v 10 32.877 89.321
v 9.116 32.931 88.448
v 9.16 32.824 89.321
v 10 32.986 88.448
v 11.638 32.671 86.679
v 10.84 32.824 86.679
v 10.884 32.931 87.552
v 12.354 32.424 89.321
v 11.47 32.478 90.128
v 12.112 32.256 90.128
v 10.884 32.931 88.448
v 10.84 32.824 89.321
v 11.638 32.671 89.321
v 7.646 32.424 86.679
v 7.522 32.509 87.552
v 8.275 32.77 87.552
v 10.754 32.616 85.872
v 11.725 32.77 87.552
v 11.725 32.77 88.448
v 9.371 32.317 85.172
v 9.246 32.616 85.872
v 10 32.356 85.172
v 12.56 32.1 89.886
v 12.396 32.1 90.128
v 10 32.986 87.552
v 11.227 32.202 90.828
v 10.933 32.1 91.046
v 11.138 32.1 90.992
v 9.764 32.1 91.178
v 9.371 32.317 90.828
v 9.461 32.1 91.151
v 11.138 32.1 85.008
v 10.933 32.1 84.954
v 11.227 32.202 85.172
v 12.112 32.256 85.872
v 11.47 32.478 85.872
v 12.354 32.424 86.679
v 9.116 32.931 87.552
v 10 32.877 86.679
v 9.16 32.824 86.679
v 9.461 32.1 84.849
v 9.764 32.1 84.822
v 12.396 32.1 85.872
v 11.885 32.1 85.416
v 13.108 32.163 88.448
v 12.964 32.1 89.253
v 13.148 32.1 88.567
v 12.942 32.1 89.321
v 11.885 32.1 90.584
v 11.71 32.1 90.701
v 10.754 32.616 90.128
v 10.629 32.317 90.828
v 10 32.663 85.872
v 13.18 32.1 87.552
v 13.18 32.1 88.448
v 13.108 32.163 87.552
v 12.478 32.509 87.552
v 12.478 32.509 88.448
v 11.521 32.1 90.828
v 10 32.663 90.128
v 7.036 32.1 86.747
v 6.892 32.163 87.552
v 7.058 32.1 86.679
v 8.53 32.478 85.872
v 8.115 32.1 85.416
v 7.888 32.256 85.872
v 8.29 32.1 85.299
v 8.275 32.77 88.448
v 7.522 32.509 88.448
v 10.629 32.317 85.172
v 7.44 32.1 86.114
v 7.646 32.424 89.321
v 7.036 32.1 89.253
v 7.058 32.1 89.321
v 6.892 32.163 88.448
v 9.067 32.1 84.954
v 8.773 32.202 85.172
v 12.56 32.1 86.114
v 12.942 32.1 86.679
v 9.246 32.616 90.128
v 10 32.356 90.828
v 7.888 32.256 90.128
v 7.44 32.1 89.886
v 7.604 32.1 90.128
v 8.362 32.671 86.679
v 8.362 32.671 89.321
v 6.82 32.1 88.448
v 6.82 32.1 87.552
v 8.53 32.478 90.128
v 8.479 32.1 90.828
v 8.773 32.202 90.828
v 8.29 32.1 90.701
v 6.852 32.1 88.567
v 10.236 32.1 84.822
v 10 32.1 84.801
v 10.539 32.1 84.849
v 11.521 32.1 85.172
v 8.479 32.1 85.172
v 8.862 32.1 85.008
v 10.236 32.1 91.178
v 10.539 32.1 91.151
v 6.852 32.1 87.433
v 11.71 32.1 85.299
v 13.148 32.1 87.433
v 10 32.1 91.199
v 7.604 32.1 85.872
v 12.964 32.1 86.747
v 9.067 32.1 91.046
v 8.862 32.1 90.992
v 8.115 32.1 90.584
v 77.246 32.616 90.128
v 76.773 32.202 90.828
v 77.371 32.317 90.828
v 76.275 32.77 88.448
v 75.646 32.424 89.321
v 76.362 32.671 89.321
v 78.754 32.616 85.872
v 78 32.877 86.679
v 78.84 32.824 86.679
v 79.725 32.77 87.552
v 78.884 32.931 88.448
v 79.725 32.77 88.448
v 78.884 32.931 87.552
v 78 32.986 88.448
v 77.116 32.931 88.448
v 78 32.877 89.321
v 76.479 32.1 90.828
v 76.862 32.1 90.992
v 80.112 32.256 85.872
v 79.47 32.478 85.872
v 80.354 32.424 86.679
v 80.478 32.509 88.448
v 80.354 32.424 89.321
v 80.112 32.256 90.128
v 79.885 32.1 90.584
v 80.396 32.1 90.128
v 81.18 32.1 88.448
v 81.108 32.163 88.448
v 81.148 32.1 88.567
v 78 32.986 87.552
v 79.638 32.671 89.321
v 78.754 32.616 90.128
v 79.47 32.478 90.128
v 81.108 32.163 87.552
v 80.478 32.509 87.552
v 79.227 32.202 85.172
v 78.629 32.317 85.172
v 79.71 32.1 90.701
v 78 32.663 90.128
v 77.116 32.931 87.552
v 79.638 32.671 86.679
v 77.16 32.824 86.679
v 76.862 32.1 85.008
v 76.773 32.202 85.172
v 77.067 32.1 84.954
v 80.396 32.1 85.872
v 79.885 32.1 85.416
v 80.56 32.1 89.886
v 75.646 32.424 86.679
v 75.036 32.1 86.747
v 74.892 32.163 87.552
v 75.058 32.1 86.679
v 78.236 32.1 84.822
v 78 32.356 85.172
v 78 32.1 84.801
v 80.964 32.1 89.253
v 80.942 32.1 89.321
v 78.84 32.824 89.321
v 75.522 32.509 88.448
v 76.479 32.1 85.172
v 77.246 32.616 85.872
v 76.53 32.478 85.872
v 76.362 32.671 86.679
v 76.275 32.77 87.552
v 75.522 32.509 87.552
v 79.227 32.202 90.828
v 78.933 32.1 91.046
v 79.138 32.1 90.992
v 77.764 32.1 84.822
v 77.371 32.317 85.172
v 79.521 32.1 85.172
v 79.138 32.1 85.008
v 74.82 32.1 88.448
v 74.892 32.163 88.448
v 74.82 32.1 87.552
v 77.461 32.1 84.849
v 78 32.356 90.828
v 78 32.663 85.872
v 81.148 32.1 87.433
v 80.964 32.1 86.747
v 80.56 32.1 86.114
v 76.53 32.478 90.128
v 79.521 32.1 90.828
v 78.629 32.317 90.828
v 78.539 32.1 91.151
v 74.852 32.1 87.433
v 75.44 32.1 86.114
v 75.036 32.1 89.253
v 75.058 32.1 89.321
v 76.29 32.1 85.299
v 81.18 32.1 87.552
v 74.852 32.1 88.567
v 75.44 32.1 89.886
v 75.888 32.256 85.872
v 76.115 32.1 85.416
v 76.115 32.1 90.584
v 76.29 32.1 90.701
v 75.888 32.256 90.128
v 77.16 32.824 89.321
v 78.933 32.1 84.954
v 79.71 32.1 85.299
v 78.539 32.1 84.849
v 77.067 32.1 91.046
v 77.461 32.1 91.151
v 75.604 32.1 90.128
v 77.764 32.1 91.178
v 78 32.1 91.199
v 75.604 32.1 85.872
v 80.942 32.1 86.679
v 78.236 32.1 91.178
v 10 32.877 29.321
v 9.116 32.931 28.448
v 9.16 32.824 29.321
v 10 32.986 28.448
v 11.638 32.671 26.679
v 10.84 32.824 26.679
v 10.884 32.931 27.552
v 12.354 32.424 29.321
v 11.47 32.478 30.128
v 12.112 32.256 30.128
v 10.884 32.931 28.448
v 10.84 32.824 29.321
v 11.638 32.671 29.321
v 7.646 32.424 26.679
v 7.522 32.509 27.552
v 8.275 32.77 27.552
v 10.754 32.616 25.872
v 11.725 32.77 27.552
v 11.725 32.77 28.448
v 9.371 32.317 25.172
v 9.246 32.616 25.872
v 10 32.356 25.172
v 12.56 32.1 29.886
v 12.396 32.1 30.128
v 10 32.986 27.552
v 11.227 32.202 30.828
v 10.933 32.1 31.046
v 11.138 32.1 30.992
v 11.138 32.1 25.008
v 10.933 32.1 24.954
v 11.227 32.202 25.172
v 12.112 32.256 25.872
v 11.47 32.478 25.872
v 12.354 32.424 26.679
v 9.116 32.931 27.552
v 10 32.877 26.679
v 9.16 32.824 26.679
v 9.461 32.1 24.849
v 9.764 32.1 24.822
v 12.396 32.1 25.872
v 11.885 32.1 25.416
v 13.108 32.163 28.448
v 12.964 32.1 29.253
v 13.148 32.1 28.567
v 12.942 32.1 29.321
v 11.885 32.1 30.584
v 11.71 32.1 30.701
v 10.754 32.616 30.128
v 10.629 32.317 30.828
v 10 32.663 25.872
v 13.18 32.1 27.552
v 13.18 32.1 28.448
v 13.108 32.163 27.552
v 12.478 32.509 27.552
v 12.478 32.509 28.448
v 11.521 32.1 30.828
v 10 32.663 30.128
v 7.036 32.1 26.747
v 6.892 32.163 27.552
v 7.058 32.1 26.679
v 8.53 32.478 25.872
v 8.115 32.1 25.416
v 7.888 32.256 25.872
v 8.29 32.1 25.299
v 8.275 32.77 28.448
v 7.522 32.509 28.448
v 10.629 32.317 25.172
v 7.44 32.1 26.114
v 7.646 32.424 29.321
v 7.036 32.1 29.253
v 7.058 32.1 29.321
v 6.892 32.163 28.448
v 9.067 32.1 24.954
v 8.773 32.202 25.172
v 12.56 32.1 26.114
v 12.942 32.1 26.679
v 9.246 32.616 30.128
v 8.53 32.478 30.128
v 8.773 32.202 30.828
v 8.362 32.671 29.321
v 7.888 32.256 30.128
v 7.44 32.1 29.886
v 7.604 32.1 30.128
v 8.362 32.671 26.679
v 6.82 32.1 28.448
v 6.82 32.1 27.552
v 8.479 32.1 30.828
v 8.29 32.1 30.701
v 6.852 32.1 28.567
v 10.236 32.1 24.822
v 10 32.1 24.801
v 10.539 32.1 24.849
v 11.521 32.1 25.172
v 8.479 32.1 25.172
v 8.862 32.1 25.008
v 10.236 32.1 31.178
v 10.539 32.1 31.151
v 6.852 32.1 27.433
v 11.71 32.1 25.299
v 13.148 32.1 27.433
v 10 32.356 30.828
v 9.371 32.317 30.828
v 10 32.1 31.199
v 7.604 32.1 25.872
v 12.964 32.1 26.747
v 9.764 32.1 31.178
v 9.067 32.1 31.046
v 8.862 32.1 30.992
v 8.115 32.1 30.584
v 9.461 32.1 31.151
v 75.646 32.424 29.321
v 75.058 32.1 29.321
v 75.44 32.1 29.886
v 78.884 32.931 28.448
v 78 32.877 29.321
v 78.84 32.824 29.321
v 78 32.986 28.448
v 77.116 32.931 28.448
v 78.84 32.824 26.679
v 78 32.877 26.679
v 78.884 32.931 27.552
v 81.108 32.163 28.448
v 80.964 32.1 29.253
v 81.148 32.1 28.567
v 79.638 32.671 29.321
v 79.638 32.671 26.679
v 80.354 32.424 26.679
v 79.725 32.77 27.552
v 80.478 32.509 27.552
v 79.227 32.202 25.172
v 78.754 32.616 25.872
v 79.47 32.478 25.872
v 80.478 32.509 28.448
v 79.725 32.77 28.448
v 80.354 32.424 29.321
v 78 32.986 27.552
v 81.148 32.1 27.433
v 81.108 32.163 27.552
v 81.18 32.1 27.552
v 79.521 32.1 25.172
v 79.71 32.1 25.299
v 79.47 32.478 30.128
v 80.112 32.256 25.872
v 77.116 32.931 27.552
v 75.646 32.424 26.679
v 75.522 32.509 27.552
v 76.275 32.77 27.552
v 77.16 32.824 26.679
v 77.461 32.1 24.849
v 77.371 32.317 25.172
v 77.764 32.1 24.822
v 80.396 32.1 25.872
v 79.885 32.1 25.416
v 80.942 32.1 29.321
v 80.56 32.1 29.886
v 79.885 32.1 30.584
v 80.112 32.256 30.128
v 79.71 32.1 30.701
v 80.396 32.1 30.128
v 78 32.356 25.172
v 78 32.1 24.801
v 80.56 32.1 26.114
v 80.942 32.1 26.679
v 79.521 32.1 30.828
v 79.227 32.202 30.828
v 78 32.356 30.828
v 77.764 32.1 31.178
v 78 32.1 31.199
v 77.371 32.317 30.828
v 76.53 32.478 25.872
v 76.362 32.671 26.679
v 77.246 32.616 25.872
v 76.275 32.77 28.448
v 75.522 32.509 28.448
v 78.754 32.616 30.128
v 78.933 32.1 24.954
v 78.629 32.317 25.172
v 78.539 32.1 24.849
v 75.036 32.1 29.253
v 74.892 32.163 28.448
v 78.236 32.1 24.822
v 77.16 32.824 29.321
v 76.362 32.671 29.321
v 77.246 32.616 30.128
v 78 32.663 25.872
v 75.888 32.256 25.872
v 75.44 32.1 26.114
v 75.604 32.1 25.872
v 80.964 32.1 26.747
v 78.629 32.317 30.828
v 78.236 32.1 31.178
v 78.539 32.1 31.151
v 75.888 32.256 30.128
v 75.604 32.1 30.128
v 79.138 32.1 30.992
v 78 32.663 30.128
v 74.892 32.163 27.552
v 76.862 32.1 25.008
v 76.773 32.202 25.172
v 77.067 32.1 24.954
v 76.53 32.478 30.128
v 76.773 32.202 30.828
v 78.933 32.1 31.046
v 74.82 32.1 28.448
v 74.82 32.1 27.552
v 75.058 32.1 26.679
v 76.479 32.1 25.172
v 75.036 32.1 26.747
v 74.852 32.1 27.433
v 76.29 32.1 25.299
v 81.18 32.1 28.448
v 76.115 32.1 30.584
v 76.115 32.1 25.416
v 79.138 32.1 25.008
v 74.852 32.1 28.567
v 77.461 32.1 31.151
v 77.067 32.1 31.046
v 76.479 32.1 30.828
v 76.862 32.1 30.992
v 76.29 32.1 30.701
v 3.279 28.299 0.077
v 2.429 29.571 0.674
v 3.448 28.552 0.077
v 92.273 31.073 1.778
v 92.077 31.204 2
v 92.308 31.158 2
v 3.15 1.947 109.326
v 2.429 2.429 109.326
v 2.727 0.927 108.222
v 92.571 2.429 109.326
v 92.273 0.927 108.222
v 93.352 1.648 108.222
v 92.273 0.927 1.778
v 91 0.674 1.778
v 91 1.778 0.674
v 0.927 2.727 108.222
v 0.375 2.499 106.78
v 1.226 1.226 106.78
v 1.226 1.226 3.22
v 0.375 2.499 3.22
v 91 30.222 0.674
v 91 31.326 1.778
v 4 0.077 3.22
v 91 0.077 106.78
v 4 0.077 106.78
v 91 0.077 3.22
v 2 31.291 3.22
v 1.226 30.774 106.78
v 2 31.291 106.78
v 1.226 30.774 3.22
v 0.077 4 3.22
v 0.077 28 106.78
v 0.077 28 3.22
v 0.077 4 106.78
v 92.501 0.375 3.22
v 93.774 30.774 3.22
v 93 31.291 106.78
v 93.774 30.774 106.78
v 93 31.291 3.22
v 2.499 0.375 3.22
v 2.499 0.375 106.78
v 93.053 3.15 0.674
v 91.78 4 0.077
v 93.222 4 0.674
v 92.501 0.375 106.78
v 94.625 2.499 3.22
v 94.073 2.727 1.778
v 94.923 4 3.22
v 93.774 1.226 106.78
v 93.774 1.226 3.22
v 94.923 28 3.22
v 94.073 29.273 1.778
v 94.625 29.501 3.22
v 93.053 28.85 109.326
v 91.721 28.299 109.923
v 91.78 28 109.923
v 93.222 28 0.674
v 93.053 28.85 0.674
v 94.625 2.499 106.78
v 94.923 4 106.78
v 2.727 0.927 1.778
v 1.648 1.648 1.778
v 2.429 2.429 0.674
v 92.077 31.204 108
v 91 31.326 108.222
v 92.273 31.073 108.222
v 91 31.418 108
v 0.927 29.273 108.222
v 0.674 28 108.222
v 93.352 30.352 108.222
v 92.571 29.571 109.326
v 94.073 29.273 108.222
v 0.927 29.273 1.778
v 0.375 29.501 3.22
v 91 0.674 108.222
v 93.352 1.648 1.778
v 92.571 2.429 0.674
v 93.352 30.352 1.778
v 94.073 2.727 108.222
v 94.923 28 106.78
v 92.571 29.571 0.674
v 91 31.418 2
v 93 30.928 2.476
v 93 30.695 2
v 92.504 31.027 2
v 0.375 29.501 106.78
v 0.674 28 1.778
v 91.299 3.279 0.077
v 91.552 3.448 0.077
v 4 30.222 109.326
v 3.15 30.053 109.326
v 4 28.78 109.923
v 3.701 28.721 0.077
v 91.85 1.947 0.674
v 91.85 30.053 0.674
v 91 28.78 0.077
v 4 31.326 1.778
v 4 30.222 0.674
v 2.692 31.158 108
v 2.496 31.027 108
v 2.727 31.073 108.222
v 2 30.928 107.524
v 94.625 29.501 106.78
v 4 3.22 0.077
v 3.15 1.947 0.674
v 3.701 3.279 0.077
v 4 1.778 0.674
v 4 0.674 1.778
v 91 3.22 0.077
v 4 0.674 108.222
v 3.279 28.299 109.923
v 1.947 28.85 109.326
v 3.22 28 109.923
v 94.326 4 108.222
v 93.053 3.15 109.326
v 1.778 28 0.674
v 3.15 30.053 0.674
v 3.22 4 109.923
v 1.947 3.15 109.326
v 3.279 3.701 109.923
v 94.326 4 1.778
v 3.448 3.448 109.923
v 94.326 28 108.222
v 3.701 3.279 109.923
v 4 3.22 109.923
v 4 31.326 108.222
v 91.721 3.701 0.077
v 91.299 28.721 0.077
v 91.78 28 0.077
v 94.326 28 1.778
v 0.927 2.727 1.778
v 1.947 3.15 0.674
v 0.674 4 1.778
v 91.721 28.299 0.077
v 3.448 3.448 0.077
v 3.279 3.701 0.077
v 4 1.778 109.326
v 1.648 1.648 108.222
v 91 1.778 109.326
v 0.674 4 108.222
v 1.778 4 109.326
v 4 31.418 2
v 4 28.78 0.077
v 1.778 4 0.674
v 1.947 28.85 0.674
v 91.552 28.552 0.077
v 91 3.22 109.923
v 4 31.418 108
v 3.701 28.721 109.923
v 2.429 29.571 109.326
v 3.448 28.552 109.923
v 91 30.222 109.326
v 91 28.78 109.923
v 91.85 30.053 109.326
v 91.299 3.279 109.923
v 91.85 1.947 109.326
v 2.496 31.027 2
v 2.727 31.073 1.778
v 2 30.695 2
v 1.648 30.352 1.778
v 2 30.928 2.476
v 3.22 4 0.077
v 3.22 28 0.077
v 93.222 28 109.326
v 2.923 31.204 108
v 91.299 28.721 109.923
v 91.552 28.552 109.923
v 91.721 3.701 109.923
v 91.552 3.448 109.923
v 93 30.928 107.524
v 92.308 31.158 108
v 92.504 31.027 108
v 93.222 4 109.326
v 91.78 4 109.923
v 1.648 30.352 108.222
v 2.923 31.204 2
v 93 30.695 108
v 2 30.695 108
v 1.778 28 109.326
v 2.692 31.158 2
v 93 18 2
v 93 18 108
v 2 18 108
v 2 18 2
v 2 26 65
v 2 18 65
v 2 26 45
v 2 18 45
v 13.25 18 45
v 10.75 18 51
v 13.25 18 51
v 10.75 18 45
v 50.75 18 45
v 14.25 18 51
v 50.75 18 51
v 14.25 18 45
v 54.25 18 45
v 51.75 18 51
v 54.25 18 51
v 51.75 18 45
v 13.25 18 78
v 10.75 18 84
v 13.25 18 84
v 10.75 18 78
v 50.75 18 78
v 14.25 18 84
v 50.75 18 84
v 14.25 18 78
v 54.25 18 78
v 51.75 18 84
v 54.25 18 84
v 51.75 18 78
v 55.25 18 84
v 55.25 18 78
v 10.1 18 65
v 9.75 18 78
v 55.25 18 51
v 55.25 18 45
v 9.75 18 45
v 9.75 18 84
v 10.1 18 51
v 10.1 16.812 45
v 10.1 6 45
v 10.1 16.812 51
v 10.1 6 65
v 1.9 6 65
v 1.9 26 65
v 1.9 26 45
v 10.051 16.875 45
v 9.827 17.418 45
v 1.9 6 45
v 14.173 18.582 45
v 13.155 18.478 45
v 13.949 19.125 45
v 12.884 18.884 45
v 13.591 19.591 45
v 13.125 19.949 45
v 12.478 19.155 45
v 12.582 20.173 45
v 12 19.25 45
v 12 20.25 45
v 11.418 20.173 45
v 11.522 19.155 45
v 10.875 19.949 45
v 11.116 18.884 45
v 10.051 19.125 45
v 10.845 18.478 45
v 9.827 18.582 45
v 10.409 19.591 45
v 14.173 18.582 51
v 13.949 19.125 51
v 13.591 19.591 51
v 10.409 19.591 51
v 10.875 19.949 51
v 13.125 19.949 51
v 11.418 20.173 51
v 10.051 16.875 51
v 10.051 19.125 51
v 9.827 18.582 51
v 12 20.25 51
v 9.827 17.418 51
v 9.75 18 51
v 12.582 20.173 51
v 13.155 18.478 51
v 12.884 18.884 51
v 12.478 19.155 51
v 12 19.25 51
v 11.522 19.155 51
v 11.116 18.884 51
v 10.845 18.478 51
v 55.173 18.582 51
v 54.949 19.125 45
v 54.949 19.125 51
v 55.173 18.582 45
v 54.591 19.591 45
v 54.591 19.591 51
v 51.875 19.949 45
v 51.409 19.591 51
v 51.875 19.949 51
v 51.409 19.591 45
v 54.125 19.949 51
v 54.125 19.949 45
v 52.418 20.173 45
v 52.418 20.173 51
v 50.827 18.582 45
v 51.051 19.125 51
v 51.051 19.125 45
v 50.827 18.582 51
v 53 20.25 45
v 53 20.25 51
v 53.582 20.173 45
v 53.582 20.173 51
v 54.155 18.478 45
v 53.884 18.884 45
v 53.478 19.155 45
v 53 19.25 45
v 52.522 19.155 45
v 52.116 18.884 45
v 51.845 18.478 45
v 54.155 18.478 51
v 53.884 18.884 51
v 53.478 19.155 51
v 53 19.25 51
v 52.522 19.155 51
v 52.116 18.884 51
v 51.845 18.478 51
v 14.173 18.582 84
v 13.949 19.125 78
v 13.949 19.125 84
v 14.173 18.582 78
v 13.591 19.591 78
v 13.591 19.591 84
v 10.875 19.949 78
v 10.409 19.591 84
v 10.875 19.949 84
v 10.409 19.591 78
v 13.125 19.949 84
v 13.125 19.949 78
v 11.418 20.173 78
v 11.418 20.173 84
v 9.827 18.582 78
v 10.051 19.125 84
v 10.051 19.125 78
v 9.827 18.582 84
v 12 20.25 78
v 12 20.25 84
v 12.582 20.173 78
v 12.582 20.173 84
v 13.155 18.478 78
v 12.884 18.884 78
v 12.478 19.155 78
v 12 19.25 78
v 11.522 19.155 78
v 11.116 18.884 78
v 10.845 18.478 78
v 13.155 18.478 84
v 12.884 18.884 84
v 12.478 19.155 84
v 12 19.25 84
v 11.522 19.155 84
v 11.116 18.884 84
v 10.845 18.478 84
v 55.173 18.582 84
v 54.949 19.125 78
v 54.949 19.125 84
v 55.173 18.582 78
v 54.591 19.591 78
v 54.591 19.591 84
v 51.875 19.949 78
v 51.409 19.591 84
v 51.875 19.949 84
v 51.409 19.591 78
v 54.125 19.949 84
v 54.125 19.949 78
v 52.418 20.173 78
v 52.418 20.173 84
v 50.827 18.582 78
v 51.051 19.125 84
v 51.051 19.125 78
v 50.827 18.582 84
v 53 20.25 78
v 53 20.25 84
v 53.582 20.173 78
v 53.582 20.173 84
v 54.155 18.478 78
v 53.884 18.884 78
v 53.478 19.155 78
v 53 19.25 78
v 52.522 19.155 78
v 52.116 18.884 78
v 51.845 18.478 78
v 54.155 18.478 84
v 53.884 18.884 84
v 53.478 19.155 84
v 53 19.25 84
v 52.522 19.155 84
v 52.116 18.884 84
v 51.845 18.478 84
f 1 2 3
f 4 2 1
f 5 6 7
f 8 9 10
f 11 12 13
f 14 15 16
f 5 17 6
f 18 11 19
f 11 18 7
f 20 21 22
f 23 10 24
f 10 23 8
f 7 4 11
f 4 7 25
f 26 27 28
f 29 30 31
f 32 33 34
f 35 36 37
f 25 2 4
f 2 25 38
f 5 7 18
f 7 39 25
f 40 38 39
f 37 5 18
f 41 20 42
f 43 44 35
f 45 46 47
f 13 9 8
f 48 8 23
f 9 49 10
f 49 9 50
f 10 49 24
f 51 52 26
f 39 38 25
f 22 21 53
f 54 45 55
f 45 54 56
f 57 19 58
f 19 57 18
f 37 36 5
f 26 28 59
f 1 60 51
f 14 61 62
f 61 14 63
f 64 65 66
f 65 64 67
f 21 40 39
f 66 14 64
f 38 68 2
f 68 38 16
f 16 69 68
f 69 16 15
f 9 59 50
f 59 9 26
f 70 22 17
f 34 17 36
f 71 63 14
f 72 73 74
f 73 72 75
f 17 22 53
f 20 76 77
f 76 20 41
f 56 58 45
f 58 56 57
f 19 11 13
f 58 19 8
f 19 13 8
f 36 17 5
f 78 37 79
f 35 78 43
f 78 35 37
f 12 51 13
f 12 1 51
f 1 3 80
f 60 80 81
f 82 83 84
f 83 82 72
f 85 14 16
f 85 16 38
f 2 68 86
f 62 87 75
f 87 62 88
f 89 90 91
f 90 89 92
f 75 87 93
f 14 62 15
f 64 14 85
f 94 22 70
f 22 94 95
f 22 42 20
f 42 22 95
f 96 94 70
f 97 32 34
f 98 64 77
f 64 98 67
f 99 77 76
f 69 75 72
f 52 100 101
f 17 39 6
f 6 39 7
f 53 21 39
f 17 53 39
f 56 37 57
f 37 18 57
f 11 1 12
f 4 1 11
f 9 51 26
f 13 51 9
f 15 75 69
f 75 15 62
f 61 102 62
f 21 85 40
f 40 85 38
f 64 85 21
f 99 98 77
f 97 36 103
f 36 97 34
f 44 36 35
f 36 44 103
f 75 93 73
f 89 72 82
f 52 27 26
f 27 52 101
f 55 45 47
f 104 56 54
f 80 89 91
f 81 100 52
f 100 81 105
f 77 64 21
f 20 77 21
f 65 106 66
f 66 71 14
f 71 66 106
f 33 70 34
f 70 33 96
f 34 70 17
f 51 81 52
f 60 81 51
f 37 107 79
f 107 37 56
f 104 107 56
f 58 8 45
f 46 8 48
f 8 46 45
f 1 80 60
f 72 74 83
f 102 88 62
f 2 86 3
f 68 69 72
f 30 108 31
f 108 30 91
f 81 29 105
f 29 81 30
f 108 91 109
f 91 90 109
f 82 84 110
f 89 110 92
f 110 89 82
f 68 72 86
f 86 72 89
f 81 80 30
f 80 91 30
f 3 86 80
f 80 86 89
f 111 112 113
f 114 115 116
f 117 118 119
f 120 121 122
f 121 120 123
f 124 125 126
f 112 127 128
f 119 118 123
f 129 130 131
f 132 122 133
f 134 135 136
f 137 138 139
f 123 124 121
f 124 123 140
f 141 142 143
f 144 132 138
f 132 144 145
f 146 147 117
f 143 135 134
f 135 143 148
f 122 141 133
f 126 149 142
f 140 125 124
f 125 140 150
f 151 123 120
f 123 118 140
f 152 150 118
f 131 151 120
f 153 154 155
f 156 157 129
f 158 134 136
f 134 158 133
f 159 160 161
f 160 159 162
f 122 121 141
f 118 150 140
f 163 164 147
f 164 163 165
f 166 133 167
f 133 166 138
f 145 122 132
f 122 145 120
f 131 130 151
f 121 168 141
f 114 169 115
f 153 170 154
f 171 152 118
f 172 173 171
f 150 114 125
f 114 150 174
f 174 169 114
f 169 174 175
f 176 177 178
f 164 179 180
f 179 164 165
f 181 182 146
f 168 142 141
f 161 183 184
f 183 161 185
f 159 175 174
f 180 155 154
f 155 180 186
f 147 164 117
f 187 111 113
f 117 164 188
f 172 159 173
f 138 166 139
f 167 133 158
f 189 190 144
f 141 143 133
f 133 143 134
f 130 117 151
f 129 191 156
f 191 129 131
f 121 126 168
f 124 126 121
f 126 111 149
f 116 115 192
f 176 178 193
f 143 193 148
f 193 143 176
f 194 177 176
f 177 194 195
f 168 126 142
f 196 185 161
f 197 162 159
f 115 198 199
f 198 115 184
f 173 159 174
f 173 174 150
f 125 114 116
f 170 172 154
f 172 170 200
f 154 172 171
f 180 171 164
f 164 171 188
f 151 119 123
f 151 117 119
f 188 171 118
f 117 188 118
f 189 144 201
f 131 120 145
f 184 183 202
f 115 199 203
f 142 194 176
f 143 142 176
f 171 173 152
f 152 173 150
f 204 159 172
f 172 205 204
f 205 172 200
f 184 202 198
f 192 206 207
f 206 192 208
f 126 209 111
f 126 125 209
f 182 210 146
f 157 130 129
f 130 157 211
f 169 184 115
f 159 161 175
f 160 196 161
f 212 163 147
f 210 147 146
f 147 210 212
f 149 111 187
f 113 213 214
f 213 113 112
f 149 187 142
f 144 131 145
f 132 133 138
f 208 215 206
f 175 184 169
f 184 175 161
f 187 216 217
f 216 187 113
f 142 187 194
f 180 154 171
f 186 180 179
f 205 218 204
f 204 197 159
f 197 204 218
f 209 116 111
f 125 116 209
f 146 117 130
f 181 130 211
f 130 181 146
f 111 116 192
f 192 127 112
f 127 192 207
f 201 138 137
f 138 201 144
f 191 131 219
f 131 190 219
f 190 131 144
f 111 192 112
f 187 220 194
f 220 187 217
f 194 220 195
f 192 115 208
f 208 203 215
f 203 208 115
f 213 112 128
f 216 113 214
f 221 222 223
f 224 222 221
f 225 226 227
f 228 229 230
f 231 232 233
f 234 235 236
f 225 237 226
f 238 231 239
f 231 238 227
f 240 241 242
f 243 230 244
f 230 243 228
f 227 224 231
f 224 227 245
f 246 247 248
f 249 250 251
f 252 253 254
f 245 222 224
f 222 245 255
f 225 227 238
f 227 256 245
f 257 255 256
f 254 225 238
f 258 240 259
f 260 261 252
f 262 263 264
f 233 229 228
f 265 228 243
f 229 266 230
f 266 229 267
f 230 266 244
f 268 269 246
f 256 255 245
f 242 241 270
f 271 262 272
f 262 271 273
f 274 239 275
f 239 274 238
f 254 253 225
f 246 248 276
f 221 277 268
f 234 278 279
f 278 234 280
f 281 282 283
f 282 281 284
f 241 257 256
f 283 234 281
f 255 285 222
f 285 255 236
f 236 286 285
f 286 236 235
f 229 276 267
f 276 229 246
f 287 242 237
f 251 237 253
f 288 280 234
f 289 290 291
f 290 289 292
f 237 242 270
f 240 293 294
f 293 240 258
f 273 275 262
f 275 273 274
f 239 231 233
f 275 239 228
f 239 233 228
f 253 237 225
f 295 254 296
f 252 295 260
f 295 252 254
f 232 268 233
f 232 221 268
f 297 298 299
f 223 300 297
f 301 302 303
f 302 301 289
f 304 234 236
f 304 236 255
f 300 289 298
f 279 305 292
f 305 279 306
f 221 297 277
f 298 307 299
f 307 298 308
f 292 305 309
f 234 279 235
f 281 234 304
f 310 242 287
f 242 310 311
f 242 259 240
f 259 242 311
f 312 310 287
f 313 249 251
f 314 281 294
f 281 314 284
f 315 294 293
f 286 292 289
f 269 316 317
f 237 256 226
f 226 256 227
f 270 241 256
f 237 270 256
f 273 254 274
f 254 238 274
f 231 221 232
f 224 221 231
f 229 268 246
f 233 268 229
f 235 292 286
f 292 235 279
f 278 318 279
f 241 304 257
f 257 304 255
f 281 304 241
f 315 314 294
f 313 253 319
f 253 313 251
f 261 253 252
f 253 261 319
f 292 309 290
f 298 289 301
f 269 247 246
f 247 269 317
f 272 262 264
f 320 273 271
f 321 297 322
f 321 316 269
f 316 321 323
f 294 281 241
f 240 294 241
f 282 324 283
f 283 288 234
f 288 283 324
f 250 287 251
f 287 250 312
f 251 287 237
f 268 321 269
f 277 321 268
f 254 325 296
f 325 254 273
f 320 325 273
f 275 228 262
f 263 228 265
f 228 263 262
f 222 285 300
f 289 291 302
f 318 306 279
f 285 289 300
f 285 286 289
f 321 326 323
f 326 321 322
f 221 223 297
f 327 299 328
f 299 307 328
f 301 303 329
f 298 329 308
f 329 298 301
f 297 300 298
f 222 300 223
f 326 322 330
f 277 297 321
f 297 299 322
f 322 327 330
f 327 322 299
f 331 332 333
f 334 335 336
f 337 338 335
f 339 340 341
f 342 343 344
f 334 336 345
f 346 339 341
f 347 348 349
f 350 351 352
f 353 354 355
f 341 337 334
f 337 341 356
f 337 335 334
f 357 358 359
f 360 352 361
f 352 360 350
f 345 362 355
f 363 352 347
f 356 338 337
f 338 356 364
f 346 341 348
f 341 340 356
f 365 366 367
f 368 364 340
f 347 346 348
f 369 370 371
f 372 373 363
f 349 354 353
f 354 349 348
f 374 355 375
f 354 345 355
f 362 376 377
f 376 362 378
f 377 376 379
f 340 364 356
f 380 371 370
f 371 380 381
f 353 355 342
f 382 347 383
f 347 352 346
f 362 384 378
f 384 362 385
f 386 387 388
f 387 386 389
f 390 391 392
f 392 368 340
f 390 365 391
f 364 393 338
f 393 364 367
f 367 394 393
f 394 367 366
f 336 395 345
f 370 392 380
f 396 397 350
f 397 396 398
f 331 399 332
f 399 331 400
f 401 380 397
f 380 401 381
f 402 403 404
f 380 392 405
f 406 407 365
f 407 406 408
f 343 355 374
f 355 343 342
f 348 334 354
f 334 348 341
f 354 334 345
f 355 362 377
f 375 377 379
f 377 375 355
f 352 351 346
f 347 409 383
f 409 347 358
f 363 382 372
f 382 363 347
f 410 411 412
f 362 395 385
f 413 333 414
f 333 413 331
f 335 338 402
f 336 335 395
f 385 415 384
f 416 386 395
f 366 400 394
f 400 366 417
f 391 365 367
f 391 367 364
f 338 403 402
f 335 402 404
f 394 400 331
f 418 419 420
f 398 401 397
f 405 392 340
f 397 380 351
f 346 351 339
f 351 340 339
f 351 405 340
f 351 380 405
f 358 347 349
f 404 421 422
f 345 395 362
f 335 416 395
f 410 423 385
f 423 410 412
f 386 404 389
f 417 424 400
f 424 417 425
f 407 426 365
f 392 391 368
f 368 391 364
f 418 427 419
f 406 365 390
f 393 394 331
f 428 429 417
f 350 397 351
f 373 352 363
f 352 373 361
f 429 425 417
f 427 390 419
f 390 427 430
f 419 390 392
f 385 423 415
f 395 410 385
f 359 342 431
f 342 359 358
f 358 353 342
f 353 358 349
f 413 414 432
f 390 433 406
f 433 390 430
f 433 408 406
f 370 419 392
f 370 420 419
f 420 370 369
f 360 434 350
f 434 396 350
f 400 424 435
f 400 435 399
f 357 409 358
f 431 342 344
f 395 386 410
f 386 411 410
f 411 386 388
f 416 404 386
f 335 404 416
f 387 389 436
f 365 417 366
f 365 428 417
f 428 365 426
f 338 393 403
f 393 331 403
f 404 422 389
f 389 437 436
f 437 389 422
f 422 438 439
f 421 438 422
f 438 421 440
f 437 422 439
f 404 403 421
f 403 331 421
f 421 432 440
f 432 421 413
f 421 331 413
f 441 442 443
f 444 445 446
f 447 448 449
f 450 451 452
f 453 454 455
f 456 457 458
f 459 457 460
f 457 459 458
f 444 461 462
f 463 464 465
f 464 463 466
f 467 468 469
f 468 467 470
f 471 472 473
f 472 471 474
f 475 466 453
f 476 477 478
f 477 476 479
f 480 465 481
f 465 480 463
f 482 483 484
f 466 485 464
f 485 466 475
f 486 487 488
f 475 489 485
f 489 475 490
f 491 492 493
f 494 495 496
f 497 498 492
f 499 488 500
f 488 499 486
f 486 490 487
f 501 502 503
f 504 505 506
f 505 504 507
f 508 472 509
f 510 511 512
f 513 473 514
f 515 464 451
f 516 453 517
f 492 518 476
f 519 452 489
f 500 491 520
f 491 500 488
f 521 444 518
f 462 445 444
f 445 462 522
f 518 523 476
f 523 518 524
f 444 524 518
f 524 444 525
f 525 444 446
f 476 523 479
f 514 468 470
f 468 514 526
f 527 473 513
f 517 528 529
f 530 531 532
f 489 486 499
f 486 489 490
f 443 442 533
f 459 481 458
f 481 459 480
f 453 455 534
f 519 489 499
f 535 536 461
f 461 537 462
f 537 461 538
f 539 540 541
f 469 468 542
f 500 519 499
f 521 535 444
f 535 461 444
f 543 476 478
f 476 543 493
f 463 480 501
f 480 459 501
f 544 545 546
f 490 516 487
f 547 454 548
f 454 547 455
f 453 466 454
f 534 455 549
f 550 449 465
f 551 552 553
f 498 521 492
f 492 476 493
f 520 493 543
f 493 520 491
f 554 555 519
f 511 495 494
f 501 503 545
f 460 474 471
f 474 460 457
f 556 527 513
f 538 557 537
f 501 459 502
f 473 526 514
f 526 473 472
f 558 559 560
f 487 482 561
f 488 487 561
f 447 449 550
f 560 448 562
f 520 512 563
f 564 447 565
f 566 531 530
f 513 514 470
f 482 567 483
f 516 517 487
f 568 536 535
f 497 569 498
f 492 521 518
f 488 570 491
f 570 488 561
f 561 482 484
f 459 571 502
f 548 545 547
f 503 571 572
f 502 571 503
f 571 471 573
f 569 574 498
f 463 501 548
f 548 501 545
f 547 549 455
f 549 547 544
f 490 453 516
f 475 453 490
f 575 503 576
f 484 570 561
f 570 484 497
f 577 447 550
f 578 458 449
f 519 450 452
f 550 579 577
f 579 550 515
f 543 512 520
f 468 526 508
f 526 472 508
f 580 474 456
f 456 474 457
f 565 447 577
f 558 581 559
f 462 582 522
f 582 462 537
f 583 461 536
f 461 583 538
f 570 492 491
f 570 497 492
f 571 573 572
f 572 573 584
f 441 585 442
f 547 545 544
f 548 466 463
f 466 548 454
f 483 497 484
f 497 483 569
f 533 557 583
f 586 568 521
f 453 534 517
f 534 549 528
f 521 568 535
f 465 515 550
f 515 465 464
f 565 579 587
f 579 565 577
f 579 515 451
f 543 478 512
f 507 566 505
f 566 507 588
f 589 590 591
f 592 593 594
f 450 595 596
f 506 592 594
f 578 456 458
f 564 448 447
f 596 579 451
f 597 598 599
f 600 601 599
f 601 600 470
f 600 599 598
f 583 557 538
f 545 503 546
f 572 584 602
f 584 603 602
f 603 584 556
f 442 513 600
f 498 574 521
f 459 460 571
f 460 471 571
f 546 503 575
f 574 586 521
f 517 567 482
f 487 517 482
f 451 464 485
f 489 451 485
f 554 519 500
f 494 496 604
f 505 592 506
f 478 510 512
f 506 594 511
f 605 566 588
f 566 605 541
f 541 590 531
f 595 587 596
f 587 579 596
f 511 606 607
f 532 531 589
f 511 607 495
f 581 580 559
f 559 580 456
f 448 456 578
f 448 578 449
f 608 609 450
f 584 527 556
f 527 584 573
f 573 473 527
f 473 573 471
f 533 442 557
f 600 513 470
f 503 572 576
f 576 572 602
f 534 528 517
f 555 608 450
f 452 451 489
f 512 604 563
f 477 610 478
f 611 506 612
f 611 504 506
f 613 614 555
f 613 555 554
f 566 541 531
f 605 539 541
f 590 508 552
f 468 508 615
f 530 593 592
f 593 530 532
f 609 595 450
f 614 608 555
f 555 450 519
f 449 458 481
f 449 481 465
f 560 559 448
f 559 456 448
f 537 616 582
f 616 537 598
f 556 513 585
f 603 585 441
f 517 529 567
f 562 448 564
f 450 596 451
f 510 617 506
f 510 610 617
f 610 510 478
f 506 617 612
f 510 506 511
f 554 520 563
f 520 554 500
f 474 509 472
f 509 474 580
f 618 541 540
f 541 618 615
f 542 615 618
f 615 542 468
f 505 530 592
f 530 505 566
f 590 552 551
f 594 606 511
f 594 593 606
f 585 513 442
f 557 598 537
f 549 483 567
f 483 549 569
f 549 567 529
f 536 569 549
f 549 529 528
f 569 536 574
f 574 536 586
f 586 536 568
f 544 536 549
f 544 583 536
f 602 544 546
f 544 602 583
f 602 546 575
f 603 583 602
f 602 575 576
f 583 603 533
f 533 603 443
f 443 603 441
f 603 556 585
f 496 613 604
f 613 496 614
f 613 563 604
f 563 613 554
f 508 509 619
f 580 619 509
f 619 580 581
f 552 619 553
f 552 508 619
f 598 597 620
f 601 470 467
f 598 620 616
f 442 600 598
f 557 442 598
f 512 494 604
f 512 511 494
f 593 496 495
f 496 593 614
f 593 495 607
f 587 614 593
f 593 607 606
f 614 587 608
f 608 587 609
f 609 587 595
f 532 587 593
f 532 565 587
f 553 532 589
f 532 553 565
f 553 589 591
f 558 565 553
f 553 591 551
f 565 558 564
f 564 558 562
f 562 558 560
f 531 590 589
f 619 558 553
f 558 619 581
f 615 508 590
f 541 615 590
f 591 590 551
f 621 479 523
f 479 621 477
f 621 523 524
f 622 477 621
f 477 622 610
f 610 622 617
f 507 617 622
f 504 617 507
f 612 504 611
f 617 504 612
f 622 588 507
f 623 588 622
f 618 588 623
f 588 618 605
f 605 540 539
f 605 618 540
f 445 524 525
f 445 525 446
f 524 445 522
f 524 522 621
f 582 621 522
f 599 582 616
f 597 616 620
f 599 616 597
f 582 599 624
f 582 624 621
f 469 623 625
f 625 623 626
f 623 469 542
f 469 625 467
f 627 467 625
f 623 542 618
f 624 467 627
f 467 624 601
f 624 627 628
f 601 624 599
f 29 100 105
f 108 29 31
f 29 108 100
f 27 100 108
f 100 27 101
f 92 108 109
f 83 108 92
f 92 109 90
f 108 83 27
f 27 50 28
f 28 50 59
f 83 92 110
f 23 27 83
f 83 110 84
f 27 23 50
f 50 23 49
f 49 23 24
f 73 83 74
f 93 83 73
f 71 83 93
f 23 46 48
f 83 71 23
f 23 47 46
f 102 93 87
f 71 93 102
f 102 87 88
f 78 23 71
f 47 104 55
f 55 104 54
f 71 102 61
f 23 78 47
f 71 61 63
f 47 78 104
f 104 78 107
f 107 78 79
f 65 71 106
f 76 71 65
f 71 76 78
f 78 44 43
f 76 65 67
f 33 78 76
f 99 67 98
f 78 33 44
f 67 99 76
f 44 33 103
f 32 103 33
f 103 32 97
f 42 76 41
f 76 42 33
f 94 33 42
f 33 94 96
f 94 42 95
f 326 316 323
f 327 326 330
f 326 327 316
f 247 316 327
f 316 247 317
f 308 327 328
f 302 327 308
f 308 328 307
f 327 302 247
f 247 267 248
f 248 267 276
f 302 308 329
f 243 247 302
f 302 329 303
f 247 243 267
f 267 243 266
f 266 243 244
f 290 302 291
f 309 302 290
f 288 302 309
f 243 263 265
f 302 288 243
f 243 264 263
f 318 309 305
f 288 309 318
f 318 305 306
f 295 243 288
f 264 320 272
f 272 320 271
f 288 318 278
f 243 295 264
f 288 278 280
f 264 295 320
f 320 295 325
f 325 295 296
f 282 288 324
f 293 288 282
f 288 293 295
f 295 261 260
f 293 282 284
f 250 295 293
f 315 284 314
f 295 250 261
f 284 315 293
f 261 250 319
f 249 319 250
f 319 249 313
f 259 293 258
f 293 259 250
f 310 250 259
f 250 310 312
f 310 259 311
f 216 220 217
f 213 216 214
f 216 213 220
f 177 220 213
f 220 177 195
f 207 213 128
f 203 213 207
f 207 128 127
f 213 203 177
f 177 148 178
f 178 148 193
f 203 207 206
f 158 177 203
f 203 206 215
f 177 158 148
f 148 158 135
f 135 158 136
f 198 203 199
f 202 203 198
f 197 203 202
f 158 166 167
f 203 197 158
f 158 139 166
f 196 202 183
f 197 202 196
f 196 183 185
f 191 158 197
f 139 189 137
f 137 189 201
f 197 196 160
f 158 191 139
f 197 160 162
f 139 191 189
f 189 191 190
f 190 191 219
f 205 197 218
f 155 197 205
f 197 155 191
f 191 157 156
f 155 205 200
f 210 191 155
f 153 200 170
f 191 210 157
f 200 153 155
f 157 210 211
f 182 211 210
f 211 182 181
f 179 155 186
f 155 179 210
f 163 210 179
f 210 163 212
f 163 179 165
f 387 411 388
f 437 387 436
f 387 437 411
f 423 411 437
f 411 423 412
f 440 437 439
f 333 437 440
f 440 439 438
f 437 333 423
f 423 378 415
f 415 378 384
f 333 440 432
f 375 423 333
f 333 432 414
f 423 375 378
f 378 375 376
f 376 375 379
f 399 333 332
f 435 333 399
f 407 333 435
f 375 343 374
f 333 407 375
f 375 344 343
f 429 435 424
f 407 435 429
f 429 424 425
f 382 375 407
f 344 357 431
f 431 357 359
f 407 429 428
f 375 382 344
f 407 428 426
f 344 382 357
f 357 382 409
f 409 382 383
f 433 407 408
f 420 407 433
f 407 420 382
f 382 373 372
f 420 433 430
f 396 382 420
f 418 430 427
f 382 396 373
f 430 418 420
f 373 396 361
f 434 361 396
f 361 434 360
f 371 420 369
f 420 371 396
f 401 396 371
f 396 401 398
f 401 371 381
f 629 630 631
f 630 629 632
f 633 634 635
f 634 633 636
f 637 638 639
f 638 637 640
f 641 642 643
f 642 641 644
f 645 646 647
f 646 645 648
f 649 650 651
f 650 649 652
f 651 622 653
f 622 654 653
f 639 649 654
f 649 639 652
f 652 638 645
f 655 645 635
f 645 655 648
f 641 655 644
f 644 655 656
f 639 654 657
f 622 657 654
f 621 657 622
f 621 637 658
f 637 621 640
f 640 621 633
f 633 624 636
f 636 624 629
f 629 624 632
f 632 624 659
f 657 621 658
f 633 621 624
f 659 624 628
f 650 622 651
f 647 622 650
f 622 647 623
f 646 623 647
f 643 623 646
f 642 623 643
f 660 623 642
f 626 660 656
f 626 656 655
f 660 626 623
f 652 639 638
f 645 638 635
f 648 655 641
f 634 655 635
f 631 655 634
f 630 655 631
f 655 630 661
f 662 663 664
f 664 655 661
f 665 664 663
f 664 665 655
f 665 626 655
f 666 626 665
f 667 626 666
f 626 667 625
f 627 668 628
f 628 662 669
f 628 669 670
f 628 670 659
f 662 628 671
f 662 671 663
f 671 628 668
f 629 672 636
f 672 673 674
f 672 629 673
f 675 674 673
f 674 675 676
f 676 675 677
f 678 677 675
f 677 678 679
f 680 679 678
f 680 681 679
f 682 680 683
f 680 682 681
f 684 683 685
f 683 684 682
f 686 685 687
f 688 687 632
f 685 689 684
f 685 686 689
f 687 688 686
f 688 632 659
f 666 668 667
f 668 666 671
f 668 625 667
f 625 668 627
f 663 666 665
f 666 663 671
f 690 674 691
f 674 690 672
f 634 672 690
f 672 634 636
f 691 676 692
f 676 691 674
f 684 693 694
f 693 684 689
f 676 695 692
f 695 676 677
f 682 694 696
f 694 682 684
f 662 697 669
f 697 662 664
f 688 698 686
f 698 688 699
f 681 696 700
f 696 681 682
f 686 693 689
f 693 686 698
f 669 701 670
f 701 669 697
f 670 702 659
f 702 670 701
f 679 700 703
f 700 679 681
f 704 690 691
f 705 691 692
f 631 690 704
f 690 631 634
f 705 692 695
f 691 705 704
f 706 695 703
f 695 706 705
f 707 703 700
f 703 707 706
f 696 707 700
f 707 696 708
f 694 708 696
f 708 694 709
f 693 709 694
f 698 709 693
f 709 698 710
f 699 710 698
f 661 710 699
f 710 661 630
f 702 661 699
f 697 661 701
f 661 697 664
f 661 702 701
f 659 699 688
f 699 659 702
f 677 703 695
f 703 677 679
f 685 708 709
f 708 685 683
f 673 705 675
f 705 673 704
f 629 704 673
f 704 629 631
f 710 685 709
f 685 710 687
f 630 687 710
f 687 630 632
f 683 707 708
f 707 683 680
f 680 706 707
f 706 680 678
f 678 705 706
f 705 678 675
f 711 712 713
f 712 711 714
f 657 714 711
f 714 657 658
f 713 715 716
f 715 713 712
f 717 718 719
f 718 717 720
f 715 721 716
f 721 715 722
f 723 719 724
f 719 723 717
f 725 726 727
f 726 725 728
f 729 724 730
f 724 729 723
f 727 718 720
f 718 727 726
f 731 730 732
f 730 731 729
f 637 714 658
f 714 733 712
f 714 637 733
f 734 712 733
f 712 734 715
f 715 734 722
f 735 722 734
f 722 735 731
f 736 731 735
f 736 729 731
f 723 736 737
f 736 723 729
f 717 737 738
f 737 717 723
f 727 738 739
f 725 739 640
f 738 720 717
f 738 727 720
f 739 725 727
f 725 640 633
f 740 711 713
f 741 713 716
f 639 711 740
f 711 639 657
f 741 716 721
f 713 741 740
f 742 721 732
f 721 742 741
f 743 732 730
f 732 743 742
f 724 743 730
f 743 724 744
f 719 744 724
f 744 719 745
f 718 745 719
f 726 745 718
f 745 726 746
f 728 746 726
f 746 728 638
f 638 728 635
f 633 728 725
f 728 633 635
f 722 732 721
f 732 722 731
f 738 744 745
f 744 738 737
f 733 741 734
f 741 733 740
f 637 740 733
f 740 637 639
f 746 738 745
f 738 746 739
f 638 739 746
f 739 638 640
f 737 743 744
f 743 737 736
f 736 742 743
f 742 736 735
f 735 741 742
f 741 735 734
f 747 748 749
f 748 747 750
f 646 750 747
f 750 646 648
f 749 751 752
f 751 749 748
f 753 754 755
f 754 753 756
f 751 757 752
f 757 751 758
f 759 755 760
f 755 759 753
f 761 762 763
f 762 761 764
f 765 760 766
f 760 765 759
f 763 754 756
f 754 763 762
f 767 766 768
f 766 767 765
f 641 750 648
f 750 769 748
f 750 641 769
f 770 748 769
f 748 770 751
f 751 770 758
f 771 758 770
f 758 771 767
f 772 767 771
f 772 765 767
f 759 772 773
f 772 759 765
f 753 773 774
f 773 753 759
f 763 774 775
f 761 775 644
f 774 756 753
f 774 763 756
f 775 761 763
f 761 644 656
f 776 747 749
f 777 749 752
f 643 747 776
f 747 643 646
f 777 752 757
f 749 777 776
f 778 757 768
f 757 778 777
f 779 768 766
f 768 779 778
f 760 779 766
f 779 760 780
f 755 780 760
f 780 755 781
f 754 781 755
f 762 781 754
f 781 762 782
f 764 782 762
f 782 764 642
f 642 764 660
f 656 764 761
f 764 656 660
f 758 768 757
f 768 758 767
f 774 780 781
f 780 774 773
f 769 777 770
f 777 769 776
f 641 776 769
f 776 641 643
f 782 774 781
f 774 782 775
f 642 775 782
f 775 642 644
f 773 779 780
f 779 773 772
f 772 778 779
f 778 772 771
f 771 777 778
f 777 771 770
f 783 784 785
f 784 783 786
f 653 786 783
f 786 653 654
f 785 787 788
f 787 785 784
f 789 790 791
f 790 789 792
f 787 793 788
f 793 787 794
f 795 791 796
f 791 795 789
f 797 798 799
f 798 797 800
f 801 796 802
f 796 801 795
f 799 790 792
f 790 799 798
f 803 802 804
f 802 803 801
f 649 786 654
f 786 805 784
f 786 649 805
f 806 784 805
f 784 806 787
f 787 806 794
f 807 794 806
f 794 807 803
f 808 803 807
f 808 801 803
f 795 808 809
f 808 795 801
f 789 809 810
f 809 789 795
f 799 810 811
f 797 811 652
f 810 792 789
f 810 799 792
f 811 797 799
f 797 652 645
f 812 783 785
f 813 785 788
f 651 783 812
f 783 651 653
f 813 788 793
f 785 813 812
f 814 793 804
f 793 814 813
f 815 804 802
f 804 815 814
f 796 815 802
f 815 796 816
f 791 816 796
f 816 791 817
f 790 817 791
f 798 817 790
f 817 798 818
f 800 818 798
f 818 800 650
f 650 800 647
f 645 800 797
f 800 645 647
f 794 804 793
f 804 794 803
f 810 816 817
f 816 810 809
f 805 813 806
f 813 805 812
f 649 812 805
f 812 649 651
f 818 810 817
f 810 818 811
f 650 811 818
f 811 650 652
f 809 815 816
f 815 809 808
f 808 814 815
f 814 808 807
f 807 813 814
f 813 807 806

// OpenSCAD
// file: ctg_variant.scad
// LCD variant overrides — ILI9341 2.4" portrait window
// Use: openscad -Dvariant=lcd -o ../stl/lcd/ctg_front_shell.stl ctg_front_shell.scad

variant = "eink"; // eink | lcd

function display_w() = variant == "lcd" ? 39 : 50;
function display_h() = variant == "lcd" ? 55 : 26;
function display_z() = variant == "lcd" ? 48 : 72;
// file: ctg_params.scad
// Shared parameters — CyberThreatGotchi Tamagotchi enclosure (mm)

// Outer envelope
width  = 95;
height = 110;
depth  = 32;
wall   = 2.0;
corner_r = 4;

// Display (Waveshare 2.13" default)
display_cut_w = 50;
display_cut_h = 26;
display_z     = 72;
bezel_lip     = 2.5;

// Ports
usbc_w = 12;
usbc_h = 6;
reset_r = 3;

// BPI-R3 Mini standoffs (verify against your board revision)
standoff_h    = 6;
standoff_od   = 4.5;
standoff_hole = 1.25;  // M2.5 pilot
standoff_positions = [[12, 45], [53, 45], [12, 78], [53, 78]];

// Cat emboss positions [x, z]
cat_bump_r = 4;
cat_positions = [[10, 88], [78, 88], [10, 28], [78, 28]];

// SPI ribbon channel (left inner wall)
ribbon_w = 8;
ribbon_d = 20;

// Rear vents
vent_count = 4;
vent_w     = 15;
vent_h     = 3;
vent_gap   = 4;

// Ethernet grommet holes (rear face)
eth_grommet_r = 4;
eth_x_positions = [24, width - 24];

// Battery tray
battery_lip     = 3;
battery_shelf_z = 18;

// Clip slots in rear shell
clip_slot_x = 6;
clip_slot_w = 10;
clip_slot_h = 14;
clip_slot_d = 2.5;

// Snap clip dimensions
clip_bar_w  = 52;
clip_arm_w  = 8;
clip_arm_h  = 16;
clip_depth  = 6;
clip_hook_h = 5;

module rounded_box(w, d, h, r) {
  hull() {
    for (dx = [r, w - r])
      for (dy = [r, d - r])
        for (dz = [r, h - r])
          translate([dx, dy, dz])
          sphere(r = r, $fn = 16);
  }
}

module standoff_post(h, od, hole) {
  difference() {
    cylinder(h = h, r = od / 2, $fn = 24);
    translate([0, 0, -0.1])
      cylinder(h = h + 1, r = hole, $fn = 16);
  }
}
// main file
// CyberThreatGotchi — FRONT SHELL
// Export e-ink: openscad -o ../stl/eink/ctg_front_shell.stl ctg_front_shell.scad
// Export LCD:   openscad -Dvariant=lcd -o ../stl/lcd/ctg_front_shell.stl ctg_front_shell.scad

include <ctg_params.scad>
include <ctg_variant.scad>

dw = display_w();
dh = display_h();
dz = display_z();

module front_shell() {
  difference() {
    union() {
      rounded_box(width, depth, height, corner_r);
      for (p = cat_positions) {
        translate([p[0], depth - 1.2, p[1]])
          scale([1, 0.55, 1])
          sphere(r = cat_bump_r, $fn = 28);
      }
      translate([(width - dw) / 2 - bezel_lip, depth - wall - bezel_lip, dz - bezel_lip])
        cube([dw + 2 * bezel_lip, bezel_lip + 0.8, dh + 2 * bezel_lip]);
    }
    translate([wall, wall + depth / 2, wall])
      cube([width - 2 * wall, depth / 2 - wall + 0.1, height - 2 * wall]);
    translate([(width - dw) / 2, depth - wall - 0.2, dz])
      cube([dw, wall + 1.5, dh]);
    translate([wall - 0.1, wall + 4, height / 2 - 10])
      cube([ribbon_w + 0.2, ribbon_d, 20]);
    translate([width / 2 - usbc_w / 2, depth - wall - 0.2, 2])
      cube([usbc_w, wall + 1.5, usbc_h]);
  }
  for (p = standoff_positions) {
    translate([p[0], depth / 2 + 2, p[1]])
      standoff_post(standoff_h, standoff_od, standoff_hole);
  }
}

front_shell();
